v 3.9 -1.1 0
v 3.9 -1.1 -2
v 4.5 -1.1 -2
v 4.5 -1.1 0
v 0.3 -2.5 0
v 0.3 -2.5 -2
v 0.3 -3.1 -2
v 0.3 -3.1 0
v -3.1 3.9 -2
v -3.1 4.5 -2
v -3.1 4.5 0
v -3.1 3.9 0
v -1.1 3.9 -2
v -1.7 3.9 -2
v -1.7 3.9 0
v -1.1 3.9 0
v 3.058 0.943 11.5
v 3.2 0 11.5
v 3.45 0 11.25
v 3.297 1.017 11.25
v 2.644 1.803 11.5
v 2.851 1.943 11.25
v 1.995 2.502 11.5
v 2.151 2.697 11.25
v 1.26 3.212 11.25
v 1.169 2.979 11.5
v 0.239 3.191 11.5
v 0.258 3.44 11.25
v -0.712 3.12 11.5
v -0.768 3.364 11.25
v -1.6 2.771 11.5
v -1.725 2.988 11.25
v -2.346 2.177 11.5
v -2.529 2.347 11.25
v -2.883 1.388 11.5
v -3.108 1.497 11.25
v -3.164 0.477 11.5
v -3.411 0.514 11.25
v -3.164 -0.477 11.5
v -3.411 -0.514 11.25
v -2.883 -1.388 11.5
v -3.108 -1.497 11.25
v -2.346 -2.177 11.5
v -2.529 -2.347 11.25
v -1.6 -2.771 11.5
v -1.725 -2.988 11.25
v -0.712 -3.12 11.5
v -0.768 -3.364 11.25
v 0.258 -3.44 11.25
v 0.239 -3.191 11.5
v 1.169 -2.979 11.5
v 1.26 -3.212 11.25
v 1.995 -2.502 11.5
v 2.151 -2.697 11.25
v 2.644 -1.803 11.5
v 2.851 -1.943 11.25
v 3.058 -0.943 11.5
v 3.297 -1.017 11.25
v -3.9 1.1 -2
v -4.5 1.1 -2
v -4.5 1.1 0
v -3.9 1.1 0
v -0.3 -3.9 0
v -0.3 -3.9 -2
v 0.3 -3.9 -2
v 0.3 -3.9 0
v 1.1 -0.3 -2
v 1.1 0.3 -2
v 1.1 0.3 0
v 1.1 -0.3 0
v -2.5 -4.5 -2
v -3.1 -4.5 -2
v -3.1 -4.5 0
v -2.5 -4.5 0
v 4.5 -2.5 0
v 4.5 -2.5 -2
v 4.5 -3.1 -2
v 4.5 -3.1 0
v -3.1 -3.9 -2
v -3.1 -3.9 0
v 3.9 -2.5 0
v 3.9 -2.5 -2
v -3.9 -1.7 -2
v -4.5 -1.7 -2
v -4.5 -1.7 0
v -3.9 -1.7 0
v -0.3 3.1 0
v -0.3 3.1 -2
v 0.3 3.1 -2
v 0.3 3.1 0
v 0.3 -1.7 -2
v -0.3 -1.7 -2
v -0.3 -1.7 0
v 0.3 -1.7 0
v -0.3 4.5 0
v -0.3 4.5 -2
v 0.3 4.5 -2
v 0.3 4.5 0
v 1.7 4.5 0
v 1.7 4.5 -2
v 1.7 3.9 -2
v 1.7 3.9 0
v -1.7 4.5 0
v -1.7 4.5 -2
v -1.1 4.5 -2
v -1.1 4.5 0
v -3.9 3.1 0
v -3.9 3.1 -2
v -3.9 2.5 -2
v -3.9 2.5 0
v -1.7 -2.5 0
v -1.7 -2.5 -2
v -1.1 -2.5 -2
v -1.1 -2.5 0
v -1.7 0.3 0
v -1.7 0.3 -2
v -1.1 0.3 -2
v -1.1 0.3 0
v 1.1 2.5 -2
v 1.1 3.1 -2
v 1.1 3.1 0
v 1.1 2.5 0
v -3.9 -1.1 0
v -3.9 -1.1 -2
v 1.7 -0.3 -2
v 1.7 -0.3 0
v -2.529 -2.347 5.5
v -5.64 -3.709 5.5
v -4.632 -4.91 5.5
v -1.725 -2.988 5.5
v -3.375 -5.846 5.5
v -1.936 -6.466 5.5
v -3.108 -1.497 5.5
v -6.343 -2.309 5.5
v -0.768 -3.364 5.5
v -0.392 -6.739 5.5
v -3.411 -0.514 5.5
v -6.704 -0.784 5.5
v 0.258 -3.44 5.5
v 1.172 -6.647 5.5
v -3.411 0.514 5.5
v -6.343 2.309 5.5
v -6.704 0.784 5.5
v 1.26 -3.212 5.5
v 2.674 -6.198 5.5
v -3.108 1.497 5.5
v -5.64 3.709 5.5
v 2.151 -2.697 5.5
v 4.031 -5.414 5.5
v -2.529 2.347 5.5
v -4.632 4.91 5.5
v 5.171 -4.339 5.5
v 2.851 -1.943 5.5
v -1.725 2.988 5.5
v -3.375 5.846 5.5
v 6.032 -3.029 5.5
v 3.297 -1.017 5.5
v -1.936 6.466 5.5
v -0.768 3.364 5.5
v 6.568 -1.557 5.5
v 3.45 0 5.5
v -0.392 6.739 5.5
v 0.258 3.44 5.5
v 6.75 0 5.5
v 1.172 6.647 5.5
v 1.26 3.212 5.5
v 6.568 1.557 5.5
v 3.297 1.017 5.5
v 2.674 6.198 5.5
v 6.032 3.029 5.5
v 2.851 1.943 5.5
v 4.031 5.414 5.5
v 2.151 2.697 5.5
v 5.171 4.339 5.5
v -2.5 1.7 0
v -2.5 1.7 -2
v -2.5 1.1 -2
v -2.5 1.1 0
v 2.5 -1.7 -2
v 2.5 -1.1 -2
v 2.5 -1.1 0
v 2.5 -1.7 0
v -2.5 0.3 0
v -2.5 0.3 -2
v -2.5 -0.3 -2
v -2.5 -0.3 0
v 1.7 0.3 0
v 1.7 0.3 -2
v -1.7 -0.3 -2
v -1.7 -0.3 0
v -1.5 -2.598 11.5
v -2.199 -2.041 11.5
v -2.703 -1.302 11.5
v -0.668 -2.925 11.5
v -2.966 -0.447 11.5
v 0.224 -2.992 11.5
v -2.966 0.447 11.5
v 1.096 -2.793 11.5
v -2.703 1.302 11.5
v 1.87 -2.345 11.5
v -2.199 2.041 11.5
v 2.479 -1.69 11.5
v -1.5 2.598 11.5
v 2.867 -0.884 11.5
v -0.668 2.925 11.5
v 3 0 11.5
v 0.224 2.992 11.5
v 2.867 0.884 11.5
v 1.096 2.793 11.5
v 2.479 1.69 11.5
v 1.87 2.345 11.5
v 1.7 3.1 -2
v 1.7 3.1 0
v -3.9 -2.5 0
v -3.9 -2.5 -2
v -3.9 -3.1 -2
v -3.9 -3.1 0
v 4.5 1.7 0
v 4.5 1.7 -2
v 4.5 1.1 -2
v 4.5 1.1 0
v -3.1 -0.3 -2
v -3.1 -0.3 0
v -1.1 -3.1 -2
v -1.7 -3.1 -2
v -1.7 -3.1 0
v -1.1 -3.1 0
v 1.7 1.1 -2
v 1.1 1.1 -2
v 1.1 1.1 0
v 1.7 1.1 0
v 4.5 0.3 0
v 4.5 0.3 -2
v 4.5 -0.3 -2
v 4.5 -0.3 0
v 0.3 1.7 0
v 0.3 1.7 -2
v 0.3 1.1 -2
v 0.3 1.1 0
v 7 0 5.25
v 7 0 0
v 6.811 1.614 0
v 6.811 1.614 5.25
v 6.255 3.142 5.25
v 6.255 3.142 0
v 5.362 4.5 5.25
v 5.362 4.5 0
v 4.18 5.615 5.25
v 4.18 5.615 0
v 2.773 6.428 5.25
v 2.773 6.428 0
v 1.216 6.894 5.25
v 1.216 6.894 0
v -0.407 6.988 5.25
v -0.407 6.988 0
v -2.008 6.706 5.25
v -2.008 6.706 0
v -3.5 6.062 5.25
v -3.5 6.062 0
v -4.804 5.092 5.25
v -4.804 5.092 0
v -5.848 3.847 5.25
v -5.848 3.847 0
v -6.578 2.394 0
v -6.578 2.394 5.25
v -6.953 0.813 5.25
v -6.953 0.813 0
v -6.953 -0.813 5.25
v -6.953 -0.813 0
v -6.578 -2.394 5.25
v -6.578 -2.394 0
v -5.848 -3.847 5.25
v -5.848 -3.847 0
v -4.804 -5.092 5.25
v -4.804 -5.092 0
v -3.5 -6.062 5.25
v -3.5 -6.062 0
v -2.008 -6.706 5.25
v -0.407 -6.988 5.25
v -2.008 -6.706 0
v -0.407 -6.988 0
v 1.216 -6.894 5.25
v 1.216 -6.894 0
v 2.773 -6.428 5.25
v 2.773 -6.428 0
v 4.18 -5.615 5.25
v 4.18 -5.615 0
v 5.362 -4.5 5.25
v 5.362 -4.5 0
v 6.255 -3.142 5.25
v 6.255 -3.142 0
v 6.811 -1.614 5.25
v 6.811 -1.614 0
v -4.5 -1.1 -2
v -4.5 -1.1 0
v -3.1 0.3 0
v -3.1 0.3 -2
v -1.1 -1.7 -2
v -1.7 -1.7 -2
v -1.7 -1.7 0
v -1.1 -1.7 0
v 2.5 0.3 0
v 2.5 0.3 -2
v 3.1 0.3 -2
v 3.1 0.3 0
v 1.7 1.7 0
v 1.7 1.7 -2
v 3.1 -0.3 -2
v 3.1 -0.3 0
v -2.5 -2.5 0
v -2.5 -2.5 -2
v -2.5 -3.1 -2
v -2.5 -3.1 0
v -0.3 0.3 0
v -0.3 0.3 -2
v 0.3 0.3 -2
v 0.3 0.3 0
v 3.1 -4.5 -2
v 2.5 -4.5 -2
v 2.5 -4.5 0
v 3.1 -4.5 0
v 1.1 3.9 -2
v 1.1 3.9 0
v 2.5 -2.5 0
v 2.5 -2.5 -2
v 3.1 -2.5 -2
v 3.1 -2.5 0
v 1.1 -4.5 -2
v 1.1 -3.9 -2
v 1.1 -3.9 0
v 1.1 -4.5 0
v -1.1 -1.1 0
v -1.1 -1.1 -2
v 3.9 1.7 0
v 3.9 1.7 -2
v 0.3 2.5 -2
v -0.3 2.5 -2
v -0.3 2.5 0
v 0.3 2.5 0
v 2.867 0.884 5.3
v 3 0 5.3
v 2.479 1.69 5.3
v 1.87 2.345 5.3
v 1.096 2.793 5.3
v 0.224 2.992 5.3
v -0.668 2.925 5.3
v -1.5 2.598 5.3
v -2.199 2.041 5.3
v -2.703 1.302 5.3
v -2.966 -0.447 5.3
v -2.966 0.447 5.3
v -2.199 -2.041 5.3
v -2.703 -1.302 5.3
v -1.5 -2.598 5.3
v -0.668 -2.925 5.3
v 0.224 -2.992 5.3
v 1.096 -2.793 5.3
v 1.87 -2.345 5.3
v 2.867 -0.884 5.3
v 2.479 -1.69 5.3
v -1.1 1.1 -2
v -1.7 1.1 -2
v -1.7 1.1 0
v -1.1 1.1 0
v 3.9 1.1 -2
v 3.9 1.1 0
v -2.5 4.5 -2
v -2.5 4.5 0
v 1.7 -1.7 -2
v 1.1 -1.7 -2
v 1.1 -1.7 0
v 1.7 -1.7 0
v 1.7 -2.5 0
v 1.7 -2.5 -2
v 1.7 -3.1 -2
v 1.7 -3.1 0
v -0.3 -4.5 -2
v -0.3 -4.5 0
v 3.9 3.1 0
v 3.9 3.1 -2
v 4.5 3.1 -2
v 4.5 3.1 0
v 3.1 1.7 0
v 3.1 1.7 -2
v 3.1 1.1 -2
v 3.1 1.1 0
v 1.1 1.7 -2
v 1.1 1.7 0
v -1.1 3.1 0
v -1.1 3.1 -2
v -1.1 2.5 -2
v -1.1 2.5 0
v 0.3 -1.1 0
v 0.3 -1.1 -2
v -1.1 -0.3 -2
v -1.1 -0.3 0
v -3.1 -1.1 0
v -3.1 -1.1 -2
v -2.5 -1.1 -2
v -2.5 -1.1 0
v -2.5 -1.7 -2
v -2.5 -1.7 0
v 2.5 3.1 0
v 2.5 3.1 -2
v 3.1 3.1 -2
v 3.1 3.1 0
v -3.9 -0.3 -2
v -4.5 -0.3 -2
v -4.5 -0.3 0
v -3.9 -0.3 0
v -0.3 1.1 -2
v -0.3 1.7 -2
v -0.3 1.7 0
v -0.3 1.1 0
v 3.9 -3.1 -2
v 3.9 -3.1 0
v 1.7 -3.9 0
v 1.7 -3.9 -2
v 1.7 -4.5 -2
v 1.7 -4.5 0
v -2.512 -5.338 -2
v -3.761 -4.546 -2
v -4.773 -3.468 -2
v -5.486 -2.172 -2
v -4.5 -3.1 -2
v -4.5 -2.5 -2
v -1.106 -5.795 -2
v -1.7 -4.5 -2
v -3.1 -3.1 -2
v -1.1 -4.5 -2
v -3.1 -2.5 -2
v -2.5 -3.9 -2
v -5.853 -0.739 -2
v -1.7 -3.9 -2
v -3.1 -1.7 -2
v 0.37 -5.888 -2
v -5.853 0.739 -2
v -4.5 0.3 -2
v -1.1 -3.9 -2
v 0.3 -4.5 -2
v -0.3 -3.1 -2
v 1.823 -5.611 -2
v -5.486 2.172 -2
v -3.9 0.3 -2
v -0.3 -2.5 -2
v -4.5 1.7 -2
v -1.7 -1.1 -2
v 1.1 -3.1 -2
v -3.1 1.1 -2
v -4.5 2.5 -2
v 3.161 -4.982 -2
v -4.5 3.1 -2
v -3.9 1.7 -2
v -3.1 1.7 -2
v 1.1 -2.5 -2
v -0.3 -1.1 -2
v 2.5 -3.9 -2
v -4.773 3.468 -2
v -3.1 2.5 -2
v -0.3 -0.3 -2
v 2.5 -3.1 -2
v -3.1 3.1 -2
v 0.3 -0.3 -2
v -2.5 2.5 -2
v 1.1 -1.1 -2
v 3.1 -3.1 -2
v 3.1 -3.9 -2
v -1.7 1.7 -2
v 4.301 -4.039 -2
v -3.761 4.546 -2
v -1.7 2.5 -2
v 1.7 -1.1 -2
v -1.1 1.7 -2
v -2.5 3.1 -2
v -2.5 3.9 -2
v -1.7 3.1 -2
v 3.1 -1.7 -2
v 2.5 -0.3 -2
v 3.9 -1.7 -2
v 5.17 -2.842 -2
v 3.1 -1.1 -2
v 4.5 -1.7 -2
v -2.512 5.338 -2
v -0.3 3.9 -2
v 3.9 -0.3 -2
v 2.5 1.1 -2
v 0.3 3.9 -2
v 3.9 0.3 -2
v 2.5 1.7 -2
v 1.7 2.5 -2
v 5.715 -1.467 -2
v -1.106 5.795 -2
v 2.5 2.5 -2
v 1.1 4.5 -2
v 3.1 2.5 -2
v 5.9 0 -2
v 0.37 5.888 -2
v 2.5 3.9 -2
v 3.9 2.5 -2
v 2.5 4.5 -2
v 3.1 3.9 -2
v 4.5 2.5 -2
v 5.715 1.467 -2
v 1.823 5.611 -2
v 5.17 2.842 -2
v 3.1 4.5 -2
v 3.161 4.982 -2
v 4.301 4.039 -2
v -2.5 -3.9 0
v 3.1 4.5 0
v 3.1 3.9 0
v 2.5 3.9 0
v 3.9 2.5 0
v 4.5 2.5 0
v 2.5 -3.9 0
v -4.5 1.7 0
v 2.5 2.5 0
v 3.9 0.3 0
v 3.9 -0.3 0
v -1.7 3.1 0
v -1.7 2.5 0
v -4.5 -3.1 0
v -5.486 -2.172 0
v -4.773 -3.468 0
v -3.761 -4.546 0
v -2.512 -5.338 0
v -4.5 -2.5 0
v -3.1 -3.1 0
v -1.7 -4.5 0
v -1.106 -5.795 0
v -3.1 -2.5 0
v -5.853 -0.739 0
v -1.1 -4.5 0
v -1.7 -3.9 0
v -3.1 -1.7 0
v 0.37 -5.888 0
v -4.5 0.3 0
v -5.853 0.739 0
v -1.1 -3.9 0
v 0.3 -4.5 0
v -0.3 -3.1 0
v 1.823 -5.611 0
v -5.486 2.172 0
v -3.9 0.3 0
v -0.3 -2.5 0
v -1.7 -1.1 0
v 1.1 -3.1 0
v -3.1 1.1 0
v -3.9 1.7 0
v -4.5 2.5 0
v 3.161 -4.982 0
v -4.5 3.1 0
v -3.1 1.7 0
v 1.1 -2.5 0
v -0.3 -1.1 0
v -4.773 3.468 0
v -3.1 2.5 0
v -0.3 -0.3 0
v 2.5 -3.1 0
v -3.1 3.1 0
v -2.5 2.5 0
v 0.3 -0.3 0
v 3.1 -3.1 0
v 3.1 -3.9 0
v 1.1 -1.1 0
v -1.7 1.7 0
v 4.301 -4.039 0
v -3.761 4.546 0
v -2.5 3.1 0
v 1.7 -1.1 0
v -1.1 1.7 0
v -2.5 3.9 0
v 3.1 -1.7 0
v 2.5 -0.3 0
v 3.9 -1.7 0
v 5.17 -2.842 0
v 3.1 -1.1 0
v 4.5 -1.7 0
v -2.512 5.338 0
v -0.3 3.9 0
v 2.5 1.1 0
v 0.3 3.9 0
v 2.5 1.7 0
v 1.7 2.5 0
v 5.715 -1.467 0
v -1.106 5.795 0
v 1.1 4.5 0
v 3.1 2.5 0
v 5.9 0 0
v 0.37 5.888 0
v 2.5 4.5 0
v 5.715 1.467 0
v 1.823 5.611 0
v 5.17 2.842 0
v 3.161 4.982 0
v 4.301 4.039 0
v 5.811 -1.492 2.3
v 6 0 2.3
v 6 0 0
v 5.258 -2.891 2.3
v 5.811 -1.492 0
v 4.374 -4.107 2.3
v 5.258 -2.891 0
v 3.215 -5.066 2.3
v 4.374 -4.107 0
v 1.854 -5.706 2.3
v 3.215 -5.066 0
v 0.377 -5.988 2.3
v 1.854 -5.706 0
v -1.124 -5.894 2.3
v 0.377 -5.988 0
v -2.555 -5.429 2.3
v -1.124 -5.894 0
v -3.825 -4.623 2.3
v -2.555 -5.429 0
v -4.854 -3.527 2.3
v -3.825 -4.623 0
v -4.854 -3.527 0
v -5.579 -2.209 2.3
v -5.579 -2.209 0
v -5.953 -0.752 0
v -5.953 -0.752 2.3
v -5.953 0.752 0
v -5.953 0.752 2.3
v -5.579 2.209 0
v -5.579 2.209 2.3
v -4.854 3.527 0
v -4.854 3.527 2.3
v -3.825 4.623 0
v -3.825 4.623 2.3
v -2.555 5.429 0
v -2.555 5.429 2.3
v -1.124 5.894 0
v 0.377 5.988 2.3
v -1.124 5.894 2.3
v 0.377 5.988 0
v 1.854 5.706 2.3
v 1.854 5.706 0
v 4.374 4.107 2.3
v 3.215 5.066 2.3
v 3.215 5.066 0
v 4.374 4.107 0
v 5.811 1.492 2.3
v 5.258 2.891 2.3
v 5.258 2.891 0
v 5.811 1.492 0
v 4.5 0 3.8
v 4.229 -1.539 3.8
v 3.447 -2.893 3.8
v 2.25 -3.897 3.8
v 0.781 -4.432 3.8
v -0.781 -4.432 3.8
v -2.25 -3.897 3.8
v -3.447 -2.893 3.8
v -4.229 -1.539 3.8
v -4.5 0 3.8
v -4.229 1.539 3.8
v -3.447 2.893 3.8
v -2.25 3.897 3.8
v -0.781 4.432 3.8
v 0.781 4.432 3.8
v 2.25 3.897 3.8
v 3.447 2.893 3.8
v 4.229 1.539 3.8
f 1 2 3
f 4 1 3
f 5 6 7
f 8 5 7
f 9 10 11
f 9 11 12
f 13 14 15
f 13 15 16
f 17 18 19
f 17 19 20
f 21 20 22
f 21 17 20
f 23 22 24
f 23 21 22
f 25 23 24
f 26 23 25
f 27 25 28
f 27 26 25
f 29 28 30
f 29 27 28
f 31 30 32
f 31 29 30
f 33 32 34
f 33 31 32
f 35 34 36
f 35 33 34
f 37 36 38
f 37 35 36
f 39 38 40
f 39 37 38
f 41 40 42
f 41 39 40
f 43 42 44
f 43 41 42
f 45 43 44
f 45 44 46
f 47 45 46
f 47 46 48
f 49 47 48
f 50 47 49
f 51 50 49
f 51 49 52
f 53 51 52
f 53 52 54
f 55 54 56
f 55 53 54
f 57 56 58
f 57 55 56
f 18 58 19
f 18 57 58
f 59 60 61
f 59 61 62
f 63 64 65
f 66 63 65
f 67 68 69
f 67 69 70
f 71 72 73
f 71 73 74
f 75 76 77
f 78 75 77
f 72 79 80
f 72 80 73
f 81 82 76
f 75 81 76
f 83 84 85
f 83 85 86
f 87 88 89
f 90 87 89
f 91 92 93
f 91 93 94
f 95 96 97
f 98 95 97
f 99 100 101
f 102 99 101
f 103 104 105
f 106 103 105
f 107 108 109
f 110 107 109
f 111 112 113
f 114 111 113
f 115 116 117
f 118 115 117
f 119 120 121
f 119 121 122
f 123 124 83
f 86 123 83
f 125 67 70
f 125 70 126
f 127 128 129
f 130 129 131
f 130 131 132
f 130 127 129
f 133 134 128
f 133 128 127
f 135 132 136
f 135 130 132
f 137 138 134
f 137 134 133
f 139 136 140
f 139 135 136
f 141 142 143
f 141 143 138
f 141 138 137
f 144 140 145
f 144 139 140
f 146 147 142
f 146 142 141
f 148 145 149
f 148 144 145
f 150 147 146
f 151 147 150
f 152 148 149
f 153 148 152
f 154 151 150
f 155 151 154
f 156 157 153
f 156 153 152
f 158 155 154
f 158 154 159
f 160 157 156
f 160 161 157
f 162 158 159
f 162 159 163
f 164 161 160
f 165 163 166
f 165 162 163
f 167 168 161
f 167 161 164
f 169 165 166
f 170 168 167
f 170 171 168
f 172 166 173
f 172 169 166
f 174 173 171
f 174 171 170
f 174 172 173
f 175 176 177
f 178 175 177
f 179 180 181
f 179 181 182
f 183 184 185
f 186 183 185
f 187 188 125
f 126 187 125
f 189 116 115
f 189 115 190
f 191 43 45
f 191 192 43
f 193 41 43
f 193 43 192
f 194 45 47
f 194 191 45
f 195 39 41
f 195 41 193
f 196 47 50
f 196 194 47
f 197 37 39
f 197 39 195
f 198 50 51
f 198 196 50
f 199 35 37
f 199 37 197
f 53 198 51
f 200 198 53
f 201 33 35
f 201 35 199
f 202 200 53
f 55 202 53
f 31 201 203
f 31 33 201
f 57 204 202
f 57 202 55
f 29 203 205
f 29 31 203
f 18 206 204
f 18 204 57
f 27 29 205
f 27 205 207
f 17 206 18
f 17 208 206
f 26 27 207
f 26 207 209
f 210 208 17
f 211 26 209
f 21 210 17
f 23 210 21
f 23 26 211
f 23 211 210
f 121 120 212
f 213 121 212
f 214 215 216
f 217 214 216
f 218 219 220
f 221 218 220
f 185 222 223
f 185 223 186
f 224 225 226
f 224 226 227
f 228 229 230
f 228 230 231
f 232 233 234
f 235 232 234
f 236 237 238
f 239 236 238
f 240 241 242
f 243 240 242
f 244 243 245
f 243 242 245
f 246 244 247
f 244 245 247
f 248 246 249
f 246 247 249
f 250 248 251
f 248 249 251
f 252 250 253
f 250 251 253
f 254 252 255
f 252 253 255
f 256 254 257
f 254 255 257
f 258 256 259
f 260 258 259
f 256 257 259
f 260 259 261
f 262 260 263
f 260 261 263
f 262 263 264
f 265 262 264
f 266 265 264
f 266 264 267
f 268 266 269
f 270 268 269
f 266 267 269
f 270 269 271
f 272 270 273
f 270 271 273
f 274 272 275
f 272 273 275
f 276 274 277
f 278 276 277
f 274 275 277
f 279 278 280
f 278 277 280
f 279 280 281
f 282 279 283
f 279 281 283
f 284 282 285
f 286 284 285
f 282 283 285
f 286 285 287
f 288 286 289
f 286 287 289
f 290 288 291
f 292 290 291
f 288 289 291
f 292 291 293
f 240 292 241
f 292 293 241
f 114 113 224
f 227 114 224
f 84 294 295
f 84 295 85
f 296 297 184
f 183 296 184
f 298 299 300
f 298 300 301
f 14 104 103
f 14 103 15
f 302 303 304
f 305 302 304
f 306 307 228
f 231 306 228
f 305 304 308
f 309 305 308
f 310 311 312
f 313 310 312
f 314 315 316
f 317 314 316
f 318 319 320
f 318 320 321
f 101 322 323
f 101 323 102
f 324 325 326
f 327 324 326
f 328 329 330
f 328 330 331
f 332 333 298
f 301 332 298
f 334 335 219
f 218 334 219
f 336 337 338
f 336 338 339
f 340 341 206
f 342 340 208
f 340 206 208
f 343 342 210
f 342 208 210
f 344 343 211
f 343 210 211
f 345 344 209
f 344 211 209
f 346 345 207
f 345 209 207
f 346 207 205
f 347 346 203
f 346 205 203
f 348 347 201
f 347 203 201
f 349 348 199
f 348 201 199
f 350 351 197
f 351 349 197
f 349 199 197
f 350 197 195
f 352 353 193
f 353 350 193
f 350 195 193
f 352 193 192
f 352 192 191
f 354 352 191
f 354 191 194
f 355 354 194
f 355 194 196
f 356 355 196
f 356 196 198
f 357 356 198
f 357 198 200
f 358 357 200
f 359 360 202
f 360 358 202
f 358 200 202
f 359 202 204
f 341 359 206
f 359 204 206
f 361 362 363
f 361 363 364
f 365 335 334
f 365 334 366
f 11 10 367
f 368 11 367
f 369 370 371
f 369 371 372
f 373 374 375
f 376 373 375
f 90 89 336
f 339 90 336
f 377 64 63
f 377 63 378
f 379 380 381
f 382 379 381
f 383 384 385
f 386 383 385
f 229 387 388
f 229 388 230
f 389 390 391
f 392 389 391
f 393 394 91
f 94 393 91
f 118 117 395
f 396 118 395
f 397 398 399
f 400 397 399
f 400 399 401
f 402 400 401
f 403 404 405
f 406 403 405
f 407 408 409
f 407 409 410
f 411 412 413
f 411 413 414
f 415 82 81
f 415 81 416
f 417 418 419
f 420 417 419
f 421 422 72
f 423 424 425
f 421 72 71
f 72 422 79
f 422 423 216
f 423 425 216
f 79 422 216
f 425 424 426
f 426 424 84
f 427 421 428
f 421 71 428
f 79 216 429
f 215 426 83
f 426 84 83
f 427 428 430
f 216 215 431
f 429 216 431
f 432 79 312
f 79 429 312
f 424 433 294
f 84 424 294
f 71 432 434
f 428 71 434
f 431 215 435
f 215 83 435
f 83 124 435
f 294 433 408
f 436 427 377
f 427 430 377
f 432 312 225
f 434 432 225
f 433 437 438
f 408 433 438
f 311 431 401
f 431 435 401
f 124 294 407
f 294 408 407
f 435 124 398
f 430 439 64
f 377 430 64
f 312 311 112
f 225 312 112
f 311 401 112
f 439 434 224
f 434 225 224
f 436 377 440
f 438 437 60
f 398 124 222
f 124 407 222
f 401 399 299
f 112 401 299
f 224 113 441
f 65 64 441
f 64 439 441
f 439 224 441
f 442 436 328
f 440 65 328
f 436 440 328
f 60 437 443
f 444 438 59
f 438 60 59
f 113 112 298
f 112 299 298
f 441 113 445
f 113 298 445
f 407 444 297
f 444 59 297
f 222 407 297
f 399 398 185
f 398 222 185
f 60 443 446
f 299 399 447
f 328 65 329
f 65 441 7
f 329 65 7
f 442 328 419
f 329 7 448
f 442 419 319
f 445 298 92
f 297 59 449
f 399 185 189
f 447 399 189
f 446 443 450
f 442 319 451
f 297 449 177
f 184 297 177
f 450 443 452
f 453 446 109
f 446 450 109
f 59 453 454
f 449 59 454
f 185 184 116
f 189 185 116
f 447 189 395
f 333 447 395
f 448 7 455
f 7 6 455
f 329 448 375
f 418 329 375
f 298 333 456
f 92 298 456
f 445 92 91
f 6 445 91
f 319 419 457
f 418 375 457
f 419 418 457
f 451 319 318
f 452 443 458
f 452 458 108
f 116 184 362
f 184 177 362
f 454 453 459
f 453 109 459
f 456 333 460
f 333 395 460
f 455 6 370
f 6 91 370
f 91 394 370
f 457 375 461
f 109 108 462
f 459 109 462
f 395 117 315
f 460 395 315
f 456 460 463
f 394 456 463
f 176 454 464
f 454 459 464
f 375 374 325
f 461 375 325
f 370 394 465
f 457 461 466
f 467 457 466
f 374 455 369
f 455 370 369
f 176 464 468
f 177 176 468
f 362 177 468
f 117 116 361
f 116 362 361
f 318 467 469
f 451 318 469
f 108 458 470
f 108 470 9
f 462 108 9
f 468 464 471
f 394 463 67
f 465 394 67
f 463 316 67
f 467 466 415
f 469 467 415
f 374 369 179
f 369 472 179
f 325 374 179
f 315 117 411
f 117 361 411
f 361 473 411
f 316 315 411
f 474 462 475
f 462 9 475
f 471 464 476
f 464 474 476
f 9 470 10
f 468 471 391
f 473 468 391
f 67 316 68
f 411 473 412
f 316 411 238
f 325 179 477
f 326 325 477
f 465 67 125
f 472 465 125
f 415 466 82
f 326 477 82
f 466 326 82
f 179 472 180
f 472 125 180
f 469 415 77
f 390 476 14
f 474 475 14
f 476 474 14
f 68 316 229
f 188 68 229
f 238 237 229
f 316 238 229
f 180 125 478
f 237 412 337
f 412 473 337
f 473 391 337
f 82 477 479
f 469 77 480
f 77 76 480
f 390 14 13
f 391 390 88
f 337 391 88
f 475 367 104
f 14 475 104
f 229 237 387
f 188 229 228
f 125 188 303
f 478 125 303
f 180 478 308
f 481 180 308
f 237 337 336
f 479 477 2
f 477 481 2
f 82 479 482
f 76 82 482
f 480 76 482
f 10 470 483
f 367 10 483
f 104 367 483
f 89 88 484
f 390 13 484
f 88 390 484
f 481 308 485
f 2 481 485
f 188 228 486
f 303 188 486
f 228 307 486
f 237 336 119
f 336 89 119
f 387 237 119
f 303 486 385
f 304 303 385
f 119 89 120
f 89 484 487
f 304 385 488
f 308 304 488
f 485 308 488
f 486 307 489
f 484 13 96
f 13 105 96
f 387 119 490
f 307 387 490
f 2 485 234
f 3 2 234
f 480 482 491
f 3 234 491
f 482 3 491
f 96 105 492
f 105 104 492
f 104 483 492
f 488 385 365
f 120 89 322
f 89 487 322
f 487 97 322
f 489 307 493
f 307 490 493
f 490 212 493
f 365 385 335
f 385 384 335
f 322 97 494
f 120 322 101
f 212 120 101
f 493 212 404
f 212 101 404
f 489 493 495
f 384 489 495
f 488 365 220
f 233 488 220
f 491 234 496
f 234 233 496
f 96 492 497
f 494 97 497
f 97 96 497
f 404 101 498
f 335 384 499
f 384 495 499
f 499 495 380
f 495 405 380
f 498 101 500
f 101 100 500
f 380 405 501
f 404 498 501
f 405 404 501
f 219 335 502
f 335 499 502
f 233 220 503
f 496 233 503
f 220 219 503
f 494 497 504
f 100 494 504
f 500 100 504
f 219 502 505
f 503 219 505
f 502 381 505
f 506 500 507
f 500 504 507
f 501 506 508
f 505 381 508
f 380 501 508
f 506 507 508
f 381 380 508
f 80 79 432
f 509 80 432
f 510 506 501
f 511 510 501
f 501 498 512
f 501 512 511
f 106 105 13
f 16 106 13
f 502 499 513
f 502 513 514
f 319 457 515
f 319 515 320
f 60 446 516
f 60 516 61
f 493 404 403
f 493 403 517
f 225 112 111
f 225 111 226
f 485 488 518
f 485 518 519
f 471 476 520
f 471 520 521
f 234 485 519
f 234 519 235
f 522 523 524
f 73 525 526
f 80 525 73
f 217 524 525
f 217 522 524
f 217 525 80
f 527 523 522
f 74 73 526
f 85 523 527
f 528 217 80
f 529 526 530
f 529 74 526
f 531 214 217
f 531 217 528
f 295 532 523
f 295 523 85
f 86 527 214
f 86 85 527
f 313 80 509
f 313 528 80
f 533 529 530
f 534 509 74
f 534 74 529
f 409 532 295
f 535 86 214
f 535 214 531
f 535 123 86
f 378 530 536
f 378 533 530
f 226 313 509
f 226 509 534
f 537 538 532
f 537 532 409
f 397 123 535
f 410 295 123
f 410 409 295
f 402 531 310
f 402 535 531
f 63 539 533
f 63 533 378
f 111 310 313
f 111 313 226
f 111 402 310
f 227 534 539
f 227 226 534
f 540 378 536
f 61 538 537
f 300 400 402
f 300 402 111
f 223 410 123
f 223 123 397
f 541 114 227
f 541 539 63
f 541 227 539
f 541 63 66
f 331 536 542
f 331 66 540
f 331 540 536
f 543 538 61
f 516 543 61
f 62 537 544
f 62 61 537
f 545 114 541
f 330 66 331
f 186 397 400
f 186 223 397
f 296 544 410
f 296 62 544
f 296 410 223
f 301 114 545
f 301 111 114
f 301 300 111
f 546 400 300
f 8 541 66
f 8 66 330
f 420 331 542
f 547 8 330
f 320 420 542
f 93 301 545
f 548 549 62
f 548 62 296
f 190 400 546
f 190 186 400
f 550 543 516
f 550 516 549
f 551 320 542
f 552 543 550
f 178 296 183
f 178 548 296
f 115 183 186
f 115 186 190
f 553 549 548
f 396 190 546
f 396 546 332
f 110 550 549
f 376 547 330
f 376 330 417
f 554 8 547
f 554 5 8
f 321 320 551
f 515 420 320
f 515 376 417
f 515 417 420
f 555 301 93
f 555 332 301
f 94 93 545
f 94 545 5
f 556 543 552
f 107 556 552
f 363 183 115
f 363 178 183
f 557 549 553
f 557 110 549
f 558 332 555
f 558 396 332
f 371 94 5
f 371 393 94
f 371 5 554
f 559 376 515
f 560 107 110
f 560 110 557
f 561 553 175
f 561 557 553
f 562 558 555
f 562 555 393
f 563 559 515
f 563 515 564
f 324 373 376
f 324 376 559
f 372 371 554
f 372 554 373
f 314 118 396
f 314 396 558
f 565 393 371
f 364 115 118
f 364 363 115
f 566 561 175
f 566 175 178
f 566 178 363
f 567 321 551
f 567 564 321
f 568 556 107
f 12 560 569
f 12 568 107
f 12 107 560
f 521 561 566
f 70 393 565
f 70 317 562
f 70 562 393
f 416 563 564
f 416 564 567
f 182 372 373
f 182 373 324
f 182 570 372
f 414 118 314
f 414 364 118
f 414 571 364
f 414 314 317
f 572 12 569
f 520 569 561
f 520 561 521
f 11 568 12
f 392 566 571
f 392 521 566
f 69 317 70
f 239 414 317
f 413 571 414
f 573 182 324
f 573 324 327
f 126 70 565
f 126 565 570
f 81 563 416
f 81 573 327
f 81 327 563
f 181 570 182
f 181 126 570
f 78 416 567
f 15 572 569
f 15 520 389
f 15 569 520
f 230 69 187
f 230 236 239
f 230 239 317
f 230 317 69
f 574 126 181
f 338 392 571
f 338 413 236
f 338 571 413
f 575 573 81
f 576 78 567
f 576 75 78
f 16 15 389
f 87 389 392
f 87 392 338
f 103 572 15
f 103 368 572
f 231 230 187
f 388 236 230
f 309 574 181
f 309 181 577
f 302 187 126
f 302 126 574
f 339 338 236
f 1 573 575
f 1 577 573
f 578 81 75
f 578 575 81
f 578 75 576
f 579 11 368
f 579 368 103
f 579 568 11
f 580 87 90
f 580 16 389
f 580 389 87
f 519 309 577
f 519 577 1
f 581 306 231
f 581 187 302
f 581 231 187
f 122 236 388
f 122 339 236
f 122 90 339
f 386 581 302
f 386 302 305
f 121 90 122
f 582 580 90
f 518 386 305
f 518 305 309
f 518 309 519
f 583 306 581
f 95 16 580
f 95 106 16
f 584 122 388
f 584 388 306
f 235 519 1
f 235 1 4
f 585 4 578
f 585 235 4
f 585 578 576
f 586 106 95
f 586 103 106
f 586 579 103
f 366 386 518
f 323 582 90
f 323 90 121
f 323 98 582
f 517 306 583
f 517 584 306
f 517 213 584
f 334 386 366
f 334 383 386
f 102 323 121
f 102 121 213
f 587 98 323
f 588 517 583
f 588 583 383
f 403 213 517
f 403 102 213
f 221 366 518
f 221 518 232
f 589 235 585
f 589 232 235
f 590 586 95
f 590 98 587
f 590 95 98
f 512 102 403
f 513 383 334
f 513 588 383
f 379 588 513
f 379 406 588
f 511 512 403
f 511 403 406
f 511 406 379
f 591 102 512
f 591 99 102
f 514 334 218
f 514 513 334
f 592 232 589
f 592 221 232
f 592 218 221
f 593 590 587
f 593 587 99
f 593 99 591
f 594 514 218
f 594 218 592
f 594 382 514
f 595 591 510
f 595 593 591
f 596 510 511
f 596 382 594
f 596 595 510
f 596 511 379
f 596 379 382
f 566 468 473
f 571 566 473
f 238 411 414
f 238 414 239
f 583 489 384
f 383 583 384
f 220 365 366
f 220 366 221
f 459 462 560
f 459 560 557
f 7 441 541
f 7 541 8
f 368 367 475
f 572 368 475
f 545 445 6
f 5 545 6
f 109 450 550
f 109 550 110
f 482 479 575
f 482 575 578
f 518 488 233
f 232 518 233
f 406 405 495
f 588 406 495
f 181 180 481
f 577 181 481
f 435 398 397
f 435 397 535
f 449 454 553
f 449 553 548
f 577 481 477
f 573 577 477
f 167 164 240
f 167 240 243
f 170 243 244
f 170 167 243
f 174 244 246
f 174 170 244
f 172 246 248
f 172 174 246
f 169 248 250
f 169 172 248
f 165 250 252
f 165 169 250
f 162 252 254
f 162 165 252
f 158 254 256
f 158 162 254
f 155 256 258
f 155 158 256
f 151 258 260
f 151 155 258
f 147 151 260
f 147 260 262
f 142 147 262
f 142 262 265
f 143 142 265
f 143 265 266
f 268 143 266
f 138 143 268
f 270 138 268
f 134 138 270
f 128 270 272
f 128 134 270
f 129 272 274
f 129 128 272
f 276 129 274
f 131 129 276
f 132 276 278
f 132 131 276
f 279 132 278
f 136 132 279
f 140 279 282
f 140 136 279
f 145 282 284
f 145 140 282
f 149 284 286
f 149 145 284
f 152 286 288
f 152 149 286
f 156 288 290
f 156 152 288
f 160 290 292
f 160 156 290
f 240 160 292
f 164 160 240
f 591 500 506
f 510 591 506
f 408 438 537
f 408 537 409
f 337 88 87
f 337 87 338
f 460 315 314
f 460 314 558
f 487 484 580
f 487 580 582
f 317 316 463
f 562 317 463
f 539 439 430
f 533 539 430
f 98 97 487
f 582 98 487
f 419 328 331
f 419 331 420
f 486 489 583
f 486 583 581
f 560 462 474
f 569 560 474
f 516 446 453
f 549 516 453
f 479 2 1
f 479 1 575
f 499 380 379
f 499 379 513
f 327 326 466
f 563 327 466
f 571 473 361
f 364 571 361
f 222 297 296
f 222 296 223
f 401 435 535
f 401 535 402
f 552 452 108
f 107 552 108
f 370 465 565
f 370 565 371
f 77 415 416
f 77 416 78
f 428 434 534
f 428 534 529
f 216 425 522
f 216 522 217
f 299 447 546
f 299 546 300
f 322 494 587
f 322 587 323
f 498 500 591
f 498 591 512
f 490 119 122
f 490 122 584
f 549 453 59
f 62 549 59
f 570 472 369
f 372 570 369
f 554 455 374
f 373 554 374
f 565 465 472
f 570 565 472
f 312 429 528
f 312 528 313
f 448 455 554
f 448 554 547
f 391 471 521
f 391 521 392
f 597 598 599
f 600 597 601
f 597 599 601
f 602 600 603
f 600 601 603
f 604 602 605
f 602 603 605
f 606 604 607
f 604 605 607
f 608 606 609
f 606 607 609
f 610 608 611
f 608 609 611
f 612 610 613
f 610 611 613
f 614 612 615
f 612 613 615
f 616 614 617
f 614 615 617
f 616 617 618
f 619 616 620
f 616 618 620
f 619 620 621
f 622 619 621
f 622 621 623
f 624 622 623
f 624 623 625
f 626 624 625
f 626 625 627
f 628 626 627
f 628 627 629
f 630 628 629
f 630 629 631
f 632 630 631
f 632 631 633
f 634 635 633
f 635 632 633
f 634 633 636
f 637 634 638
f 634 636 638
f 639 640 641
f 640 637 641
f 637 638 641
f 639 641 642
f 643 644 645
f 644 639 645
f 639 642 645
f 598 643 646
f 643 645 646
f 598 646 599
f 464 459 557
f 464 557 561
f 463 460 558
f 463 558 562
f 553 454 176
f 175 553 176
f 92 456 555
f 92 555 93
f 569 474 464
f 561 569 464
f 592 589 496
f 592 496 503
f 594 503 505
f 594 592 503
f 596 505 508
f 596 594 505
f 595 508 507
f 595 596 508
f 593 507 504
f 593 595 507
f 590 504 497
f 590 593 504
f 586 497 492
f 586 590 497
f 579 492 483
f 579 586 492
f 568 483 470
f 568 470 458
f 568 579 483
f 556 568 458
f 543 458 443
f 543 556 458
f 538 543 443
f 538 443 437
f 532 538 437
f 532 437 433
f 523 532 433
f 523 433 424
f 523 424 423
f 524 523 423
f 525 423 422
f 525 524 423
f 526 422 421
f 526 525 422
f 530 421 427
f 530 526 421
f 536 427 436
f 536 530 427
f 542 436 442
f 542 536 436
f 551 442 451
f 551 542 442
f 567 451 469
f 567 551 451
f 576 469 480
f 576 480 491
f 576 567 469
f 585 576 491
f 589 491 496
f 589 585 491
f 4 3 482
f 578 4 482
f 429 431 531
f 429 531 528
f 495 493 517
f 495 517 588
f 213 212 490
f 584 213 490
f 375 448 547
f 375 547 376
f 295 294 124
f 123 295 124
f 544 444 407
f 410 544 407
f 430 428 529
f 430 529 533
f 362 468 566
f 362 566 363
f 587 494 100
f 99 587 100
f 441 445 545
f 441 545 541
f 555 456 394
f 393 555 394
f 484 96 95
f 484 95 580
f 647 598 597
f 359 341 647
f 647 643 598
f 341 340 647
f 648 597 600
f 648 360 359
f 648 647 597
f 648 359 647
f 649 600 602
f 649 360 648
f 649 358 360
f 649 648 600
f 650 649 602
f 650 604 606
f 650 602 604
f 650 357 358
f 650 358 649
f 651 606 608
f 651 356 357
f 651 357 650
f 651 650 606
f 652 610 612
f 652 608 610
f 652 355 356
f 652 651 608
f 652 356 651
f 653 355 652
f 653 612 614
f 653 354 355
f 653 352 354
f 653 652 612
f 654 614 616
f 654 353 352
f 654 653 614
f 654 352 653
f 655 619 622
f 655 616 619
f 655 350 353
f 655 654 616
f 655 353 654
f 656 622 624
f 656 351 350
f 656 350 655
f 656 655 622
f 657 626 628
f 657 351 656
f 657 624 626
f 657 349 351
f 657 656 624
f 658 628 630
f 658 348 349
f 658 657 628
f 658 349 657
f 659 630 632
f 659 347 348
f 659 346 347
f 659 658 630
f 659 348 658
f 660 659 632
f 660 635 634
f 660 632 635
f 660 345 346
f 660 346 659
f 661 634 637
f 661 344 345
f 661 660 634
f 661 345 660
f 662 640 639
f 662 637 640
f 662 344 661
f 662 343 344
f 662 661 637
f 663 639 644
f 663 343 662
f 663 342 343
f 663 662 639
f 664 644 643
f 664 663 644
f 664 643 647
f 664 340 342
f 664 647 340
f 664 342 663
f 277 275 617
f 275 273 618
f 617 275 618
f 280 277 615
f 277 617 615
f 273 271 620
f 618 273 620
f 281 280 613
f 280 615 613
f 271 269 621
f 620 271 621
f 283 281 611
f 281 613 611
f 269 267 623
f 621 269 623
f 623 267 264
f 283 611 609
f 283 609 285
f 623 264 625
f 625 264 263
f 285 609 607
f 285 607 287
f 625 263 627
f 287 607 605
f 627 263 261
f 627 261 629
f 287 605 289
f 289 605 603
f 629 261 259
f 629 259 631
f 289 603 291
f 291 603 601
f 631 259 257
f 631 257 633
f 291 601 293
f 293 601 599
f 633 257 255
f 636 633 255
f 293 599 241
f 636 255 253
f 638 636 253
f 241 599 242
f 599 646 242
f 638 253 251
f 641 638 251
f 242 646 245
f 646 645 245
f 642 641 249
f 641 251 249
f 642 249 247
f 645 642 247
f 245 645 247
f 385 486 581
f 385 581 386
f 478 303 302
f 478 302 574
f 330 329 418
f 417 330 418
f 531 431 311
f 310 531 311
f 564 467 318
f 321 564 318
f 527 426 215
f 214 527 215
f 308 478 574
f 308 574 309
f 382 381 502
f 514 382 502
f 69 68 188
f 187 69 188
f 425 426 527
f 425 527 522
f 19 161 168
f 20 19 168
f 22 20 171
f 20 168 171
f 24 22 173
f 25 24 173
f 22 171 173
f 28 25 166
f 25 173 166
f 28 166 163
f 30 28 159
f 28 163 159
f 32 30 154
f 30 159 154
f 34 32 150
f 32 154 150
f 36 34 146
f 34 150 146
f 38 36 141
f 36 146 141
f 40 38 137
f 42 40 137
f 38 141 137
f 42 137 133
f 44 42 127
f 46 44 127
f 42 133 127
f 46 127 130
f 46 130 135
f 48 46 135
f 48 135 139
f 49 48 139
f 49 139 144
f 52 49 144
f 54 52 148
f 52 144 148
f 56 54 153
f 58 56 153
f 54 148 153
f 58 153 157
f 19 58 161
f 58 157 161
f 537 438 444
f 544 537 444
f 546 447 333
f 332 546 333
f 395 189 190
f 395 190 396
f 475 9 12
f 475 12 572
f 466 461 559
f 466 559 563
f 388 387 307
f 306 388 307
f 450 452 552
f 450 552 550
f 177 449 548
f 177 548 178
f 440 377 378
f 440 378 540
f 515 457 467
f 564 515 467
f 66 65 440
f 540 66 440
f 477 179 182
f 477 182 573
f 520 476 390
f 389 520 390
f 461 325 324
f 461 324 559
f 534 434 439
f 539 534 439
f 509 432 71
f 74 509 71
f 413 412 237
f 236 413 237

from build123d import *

# Parameters (mm, degrees)
F0_R        = 7
F1_DEPTH    = 5.5
F2_R        = 3.45
F3_DEPTH    = 6
F4_R        = 3
F5_DEPTH    = 25
F6_R        = 6
F6_R_2      = 3
F7_DEPTH    = 2
F8_S5_R     = 6
F8_T6_DEPTH = 11
F9_SIZE     = 0.25
F10_R       = 5.9
F11_DEPTH   = 2
F12_W       = 0.6
F12_H       = 0.6
F13_DEPTH   = 25


# Not quite as in the source:
# - a fillet or chamfer that OpenCascade refuses, or shapes differently, is made with other operations: its cross-section is extruded or revolved along the edge and cut away or added


with BuildPart() as f1:
    # F0 (on Top) → F1 (new body)
    with BuildSketch(Plane.XY):
        Circle(F0_R)
    extrude(amount=F1_DEPTH)

    # F2 (on face) → F3 (join)
    with BuildSketch(Plane.XY.offset(5.5)):
        Circle(F2_R)
    extrude(amount=F3_DEPTH)

    # F4 (on face) → F5 (cut)
    with BuildSketch(Plane.XY.offset(11.5)):
        Circle(F4_R)
    extrude(amount=-F5_DEPTH, mode=Mode.SUBTRACT)

    # F6 (on face) → F7 (cut)
    with BuildSketch(Plane(origin=(0, 0, 0), x_dir=(1, 0, 0), z_dir=(0, 0, -1))):
        Circle(F6_R)
        Circle(F6_R_2, mode=Mode.SUBTRACT)
    extrude(amount=-F7_DEPTH, mode=Mode.SUBTRACT)

    # F8: chamfer of 3.3 on 1 edges, made by hand


with BuildPart() as f8_tool2:
    # F8_s3 → F8_t4 (revolve)
    with BuildSketch(Plane.XZ):
        Polygon((6.3, 2), (3, 5.3), (3, 2), align=None)
    revolve(axis=Axis((0, 0, 2), (0, 0, -1)))

    # F8_s5 → F8_t6 (intersect, symmetric)
    with BuildSketch(Plane.XY.offset(3.6)):
        Circle(F8_S5_R)
    extrude(amount=F8_T6_DEPTH, both=True, mode=Mode.INTERSECT)


with BuildPart() as f1_1:
    add(f1.part)

    # F8_t1: cut F8_tool2
    add(f8_tool2.part, mode=Mode.SUBTRACT)

    # F9
    f9_edges = [f1_1.edges().sort_by_distance(p)[0] for p in [
        (-3.45, 0, 11.5),
        (-7, 0, 5.5),
    ]]
    chamfer(f9_edges, length=F9_SIZE)


with BuildPart() as f11:
    # F10 (on Top) → F11 (new body)
    with BuildSketch(Plane.XY):
        Circle(F10_R)
    extrude(amount=-F11_DEPTH)

    # F12 (on face) → F13 (cut)
    with BuildSketch(Plane(origin=(0, 0, -2), x_dir=(1, 0, 0), z_dir=(0, 0, -1))):
        with Locations((-2.8, 1.4)):
            Rectangle(F12_W, F12_H)
        with Locations((-2.8, 2.8)):
            Rectangle(F12_W, F12_H)
        with Locations((-2.8, 4.2)):
            Rectangle(F12_W, F12_H)
        with Locations((-1.4, 4.2)):
            Rectangle(F12_W, F12_H)
        with Locations((0, 4.2)):
            Rectangle(F12_W, F12_H)
        with Locations((1.4, 4.2)):
            Rectangle(F12_W, F12_H)
        with Locations((-4.2, 2.8)):
            Rectangle(F12_W, F12_H)
        with Locations((-4.2, 1.4)):
            Rectangle(F12_W, F12_H)
        with Locations((-4.2, 0)):
            Rectangle(F12_W, F12_H)
        with Locations((-4.2, -1.4)):
            Rectangle(F12_W, F12_H)
        with Locations((-4.2, -2.8)):
            Rectangle(F12_W, F12_H)
        with Locations((-2.8, -2.8)):
            Rectangle(F12_W, F12_H)
        with Locations((-2.8, -1.4)):
            Rectangle(F12_W, F12_H)
        with Locations((-2.8, 0)):
            Rectangle(F12_W, F12_H)
        with Locations((-1.4, 1.4)):
            Rectangle(F12_W, F12_H)
        with Locations((-1.4, 2.8)):
            Rectangle(F12_W, F12_H)
        with Locations((0, 2.8)):
            Rectangle(F12_W, F12_H)
        with Locations((0, 1.4)):
            Rectangle(F12_W, F12_H)
        Rectangle(F12_W, F12_H)
        with Locations((-1.4, 0)):
            Rectangle(F12_W, F12_H)
        with Locations((-1.4, -1.4)):
            Rectangle(F12_W, F12_H)
        with Locations((-1.4, -2.8)):
            Rectangle(F12_W, F12_H)
        with Locations((-2.8, -4.2)):
            Rectangle(F12_W, F12_H)
        with Locations((-1.4, -4.2)):
            Rectangle(F12_W, F12_H)
        with Locations((0, -4.2)):
            Rectangle(F12_W, F12_H)
        with Locations((1.4, -4.2)):
            Rectangle(F12_W, F12_H)
        with Locations((2.8, -4.2)):
            Rectangle(F12_W, F12_H)
        with Locations((4.2, -2.8)):
            Rectangle(F12_W, F12_H)
        with Locations((2.8, -2.8)):
            Rectangle(F12_W, F12_H)
        with Locations((1.4, -2.8)):
            Rectangle(F12_W, F12_H)
        with Locations((1.4, -1.4)):
            Rectangle(F12_W, F12_H)
        with Locations((1.4, 0)):
            Rectangle(F12_W, F12_H)
        with Locations((1.4, 1.4)):
            Rectangle(F12_W, F12_H)
        with Locations((2.8, 4.2)):
            Rectangle(F12_W, F12_H)
        with Locations((4.2, 2.8)):
            Rectangle(F12_W, F12_H)
        with Locations((4.2, 1.4)):
            Rectangle(F12_W, F12_H)
        with Locations((4.2, 0)):
            Rectangle(F12_W, F12_H)
        with Locations((4.2, -1.4)):
            Rectangle(F12_W, F12_H)
        with Locations((2.8, -1.4)):
            Rectangle(F12_W, F12_H)
        with Locations((2.8, 0)):
            Rectangle(F12_W, F12_H)
        with Locations((2.8, 1.4)):
            Rectangle(F12_W, F12_H)
        with Locations((2.8, 2.8)):
            Rectangle(F12_W, F12_H)
        with Locations((0, -1.4)):
            Rectangle(F12_W, F12_H)
        with Locations((0, -2.8)):
            Rectangle(F12_W, F12_H)
        with Locations((1.4, 2.8)):
            Rectangle(F12_W, F12_H)
    extrude(amount=-F13_DEPTH, mode=Mode.SUBTRACT)


solid = Compound([f1_1.part, f11.part])
